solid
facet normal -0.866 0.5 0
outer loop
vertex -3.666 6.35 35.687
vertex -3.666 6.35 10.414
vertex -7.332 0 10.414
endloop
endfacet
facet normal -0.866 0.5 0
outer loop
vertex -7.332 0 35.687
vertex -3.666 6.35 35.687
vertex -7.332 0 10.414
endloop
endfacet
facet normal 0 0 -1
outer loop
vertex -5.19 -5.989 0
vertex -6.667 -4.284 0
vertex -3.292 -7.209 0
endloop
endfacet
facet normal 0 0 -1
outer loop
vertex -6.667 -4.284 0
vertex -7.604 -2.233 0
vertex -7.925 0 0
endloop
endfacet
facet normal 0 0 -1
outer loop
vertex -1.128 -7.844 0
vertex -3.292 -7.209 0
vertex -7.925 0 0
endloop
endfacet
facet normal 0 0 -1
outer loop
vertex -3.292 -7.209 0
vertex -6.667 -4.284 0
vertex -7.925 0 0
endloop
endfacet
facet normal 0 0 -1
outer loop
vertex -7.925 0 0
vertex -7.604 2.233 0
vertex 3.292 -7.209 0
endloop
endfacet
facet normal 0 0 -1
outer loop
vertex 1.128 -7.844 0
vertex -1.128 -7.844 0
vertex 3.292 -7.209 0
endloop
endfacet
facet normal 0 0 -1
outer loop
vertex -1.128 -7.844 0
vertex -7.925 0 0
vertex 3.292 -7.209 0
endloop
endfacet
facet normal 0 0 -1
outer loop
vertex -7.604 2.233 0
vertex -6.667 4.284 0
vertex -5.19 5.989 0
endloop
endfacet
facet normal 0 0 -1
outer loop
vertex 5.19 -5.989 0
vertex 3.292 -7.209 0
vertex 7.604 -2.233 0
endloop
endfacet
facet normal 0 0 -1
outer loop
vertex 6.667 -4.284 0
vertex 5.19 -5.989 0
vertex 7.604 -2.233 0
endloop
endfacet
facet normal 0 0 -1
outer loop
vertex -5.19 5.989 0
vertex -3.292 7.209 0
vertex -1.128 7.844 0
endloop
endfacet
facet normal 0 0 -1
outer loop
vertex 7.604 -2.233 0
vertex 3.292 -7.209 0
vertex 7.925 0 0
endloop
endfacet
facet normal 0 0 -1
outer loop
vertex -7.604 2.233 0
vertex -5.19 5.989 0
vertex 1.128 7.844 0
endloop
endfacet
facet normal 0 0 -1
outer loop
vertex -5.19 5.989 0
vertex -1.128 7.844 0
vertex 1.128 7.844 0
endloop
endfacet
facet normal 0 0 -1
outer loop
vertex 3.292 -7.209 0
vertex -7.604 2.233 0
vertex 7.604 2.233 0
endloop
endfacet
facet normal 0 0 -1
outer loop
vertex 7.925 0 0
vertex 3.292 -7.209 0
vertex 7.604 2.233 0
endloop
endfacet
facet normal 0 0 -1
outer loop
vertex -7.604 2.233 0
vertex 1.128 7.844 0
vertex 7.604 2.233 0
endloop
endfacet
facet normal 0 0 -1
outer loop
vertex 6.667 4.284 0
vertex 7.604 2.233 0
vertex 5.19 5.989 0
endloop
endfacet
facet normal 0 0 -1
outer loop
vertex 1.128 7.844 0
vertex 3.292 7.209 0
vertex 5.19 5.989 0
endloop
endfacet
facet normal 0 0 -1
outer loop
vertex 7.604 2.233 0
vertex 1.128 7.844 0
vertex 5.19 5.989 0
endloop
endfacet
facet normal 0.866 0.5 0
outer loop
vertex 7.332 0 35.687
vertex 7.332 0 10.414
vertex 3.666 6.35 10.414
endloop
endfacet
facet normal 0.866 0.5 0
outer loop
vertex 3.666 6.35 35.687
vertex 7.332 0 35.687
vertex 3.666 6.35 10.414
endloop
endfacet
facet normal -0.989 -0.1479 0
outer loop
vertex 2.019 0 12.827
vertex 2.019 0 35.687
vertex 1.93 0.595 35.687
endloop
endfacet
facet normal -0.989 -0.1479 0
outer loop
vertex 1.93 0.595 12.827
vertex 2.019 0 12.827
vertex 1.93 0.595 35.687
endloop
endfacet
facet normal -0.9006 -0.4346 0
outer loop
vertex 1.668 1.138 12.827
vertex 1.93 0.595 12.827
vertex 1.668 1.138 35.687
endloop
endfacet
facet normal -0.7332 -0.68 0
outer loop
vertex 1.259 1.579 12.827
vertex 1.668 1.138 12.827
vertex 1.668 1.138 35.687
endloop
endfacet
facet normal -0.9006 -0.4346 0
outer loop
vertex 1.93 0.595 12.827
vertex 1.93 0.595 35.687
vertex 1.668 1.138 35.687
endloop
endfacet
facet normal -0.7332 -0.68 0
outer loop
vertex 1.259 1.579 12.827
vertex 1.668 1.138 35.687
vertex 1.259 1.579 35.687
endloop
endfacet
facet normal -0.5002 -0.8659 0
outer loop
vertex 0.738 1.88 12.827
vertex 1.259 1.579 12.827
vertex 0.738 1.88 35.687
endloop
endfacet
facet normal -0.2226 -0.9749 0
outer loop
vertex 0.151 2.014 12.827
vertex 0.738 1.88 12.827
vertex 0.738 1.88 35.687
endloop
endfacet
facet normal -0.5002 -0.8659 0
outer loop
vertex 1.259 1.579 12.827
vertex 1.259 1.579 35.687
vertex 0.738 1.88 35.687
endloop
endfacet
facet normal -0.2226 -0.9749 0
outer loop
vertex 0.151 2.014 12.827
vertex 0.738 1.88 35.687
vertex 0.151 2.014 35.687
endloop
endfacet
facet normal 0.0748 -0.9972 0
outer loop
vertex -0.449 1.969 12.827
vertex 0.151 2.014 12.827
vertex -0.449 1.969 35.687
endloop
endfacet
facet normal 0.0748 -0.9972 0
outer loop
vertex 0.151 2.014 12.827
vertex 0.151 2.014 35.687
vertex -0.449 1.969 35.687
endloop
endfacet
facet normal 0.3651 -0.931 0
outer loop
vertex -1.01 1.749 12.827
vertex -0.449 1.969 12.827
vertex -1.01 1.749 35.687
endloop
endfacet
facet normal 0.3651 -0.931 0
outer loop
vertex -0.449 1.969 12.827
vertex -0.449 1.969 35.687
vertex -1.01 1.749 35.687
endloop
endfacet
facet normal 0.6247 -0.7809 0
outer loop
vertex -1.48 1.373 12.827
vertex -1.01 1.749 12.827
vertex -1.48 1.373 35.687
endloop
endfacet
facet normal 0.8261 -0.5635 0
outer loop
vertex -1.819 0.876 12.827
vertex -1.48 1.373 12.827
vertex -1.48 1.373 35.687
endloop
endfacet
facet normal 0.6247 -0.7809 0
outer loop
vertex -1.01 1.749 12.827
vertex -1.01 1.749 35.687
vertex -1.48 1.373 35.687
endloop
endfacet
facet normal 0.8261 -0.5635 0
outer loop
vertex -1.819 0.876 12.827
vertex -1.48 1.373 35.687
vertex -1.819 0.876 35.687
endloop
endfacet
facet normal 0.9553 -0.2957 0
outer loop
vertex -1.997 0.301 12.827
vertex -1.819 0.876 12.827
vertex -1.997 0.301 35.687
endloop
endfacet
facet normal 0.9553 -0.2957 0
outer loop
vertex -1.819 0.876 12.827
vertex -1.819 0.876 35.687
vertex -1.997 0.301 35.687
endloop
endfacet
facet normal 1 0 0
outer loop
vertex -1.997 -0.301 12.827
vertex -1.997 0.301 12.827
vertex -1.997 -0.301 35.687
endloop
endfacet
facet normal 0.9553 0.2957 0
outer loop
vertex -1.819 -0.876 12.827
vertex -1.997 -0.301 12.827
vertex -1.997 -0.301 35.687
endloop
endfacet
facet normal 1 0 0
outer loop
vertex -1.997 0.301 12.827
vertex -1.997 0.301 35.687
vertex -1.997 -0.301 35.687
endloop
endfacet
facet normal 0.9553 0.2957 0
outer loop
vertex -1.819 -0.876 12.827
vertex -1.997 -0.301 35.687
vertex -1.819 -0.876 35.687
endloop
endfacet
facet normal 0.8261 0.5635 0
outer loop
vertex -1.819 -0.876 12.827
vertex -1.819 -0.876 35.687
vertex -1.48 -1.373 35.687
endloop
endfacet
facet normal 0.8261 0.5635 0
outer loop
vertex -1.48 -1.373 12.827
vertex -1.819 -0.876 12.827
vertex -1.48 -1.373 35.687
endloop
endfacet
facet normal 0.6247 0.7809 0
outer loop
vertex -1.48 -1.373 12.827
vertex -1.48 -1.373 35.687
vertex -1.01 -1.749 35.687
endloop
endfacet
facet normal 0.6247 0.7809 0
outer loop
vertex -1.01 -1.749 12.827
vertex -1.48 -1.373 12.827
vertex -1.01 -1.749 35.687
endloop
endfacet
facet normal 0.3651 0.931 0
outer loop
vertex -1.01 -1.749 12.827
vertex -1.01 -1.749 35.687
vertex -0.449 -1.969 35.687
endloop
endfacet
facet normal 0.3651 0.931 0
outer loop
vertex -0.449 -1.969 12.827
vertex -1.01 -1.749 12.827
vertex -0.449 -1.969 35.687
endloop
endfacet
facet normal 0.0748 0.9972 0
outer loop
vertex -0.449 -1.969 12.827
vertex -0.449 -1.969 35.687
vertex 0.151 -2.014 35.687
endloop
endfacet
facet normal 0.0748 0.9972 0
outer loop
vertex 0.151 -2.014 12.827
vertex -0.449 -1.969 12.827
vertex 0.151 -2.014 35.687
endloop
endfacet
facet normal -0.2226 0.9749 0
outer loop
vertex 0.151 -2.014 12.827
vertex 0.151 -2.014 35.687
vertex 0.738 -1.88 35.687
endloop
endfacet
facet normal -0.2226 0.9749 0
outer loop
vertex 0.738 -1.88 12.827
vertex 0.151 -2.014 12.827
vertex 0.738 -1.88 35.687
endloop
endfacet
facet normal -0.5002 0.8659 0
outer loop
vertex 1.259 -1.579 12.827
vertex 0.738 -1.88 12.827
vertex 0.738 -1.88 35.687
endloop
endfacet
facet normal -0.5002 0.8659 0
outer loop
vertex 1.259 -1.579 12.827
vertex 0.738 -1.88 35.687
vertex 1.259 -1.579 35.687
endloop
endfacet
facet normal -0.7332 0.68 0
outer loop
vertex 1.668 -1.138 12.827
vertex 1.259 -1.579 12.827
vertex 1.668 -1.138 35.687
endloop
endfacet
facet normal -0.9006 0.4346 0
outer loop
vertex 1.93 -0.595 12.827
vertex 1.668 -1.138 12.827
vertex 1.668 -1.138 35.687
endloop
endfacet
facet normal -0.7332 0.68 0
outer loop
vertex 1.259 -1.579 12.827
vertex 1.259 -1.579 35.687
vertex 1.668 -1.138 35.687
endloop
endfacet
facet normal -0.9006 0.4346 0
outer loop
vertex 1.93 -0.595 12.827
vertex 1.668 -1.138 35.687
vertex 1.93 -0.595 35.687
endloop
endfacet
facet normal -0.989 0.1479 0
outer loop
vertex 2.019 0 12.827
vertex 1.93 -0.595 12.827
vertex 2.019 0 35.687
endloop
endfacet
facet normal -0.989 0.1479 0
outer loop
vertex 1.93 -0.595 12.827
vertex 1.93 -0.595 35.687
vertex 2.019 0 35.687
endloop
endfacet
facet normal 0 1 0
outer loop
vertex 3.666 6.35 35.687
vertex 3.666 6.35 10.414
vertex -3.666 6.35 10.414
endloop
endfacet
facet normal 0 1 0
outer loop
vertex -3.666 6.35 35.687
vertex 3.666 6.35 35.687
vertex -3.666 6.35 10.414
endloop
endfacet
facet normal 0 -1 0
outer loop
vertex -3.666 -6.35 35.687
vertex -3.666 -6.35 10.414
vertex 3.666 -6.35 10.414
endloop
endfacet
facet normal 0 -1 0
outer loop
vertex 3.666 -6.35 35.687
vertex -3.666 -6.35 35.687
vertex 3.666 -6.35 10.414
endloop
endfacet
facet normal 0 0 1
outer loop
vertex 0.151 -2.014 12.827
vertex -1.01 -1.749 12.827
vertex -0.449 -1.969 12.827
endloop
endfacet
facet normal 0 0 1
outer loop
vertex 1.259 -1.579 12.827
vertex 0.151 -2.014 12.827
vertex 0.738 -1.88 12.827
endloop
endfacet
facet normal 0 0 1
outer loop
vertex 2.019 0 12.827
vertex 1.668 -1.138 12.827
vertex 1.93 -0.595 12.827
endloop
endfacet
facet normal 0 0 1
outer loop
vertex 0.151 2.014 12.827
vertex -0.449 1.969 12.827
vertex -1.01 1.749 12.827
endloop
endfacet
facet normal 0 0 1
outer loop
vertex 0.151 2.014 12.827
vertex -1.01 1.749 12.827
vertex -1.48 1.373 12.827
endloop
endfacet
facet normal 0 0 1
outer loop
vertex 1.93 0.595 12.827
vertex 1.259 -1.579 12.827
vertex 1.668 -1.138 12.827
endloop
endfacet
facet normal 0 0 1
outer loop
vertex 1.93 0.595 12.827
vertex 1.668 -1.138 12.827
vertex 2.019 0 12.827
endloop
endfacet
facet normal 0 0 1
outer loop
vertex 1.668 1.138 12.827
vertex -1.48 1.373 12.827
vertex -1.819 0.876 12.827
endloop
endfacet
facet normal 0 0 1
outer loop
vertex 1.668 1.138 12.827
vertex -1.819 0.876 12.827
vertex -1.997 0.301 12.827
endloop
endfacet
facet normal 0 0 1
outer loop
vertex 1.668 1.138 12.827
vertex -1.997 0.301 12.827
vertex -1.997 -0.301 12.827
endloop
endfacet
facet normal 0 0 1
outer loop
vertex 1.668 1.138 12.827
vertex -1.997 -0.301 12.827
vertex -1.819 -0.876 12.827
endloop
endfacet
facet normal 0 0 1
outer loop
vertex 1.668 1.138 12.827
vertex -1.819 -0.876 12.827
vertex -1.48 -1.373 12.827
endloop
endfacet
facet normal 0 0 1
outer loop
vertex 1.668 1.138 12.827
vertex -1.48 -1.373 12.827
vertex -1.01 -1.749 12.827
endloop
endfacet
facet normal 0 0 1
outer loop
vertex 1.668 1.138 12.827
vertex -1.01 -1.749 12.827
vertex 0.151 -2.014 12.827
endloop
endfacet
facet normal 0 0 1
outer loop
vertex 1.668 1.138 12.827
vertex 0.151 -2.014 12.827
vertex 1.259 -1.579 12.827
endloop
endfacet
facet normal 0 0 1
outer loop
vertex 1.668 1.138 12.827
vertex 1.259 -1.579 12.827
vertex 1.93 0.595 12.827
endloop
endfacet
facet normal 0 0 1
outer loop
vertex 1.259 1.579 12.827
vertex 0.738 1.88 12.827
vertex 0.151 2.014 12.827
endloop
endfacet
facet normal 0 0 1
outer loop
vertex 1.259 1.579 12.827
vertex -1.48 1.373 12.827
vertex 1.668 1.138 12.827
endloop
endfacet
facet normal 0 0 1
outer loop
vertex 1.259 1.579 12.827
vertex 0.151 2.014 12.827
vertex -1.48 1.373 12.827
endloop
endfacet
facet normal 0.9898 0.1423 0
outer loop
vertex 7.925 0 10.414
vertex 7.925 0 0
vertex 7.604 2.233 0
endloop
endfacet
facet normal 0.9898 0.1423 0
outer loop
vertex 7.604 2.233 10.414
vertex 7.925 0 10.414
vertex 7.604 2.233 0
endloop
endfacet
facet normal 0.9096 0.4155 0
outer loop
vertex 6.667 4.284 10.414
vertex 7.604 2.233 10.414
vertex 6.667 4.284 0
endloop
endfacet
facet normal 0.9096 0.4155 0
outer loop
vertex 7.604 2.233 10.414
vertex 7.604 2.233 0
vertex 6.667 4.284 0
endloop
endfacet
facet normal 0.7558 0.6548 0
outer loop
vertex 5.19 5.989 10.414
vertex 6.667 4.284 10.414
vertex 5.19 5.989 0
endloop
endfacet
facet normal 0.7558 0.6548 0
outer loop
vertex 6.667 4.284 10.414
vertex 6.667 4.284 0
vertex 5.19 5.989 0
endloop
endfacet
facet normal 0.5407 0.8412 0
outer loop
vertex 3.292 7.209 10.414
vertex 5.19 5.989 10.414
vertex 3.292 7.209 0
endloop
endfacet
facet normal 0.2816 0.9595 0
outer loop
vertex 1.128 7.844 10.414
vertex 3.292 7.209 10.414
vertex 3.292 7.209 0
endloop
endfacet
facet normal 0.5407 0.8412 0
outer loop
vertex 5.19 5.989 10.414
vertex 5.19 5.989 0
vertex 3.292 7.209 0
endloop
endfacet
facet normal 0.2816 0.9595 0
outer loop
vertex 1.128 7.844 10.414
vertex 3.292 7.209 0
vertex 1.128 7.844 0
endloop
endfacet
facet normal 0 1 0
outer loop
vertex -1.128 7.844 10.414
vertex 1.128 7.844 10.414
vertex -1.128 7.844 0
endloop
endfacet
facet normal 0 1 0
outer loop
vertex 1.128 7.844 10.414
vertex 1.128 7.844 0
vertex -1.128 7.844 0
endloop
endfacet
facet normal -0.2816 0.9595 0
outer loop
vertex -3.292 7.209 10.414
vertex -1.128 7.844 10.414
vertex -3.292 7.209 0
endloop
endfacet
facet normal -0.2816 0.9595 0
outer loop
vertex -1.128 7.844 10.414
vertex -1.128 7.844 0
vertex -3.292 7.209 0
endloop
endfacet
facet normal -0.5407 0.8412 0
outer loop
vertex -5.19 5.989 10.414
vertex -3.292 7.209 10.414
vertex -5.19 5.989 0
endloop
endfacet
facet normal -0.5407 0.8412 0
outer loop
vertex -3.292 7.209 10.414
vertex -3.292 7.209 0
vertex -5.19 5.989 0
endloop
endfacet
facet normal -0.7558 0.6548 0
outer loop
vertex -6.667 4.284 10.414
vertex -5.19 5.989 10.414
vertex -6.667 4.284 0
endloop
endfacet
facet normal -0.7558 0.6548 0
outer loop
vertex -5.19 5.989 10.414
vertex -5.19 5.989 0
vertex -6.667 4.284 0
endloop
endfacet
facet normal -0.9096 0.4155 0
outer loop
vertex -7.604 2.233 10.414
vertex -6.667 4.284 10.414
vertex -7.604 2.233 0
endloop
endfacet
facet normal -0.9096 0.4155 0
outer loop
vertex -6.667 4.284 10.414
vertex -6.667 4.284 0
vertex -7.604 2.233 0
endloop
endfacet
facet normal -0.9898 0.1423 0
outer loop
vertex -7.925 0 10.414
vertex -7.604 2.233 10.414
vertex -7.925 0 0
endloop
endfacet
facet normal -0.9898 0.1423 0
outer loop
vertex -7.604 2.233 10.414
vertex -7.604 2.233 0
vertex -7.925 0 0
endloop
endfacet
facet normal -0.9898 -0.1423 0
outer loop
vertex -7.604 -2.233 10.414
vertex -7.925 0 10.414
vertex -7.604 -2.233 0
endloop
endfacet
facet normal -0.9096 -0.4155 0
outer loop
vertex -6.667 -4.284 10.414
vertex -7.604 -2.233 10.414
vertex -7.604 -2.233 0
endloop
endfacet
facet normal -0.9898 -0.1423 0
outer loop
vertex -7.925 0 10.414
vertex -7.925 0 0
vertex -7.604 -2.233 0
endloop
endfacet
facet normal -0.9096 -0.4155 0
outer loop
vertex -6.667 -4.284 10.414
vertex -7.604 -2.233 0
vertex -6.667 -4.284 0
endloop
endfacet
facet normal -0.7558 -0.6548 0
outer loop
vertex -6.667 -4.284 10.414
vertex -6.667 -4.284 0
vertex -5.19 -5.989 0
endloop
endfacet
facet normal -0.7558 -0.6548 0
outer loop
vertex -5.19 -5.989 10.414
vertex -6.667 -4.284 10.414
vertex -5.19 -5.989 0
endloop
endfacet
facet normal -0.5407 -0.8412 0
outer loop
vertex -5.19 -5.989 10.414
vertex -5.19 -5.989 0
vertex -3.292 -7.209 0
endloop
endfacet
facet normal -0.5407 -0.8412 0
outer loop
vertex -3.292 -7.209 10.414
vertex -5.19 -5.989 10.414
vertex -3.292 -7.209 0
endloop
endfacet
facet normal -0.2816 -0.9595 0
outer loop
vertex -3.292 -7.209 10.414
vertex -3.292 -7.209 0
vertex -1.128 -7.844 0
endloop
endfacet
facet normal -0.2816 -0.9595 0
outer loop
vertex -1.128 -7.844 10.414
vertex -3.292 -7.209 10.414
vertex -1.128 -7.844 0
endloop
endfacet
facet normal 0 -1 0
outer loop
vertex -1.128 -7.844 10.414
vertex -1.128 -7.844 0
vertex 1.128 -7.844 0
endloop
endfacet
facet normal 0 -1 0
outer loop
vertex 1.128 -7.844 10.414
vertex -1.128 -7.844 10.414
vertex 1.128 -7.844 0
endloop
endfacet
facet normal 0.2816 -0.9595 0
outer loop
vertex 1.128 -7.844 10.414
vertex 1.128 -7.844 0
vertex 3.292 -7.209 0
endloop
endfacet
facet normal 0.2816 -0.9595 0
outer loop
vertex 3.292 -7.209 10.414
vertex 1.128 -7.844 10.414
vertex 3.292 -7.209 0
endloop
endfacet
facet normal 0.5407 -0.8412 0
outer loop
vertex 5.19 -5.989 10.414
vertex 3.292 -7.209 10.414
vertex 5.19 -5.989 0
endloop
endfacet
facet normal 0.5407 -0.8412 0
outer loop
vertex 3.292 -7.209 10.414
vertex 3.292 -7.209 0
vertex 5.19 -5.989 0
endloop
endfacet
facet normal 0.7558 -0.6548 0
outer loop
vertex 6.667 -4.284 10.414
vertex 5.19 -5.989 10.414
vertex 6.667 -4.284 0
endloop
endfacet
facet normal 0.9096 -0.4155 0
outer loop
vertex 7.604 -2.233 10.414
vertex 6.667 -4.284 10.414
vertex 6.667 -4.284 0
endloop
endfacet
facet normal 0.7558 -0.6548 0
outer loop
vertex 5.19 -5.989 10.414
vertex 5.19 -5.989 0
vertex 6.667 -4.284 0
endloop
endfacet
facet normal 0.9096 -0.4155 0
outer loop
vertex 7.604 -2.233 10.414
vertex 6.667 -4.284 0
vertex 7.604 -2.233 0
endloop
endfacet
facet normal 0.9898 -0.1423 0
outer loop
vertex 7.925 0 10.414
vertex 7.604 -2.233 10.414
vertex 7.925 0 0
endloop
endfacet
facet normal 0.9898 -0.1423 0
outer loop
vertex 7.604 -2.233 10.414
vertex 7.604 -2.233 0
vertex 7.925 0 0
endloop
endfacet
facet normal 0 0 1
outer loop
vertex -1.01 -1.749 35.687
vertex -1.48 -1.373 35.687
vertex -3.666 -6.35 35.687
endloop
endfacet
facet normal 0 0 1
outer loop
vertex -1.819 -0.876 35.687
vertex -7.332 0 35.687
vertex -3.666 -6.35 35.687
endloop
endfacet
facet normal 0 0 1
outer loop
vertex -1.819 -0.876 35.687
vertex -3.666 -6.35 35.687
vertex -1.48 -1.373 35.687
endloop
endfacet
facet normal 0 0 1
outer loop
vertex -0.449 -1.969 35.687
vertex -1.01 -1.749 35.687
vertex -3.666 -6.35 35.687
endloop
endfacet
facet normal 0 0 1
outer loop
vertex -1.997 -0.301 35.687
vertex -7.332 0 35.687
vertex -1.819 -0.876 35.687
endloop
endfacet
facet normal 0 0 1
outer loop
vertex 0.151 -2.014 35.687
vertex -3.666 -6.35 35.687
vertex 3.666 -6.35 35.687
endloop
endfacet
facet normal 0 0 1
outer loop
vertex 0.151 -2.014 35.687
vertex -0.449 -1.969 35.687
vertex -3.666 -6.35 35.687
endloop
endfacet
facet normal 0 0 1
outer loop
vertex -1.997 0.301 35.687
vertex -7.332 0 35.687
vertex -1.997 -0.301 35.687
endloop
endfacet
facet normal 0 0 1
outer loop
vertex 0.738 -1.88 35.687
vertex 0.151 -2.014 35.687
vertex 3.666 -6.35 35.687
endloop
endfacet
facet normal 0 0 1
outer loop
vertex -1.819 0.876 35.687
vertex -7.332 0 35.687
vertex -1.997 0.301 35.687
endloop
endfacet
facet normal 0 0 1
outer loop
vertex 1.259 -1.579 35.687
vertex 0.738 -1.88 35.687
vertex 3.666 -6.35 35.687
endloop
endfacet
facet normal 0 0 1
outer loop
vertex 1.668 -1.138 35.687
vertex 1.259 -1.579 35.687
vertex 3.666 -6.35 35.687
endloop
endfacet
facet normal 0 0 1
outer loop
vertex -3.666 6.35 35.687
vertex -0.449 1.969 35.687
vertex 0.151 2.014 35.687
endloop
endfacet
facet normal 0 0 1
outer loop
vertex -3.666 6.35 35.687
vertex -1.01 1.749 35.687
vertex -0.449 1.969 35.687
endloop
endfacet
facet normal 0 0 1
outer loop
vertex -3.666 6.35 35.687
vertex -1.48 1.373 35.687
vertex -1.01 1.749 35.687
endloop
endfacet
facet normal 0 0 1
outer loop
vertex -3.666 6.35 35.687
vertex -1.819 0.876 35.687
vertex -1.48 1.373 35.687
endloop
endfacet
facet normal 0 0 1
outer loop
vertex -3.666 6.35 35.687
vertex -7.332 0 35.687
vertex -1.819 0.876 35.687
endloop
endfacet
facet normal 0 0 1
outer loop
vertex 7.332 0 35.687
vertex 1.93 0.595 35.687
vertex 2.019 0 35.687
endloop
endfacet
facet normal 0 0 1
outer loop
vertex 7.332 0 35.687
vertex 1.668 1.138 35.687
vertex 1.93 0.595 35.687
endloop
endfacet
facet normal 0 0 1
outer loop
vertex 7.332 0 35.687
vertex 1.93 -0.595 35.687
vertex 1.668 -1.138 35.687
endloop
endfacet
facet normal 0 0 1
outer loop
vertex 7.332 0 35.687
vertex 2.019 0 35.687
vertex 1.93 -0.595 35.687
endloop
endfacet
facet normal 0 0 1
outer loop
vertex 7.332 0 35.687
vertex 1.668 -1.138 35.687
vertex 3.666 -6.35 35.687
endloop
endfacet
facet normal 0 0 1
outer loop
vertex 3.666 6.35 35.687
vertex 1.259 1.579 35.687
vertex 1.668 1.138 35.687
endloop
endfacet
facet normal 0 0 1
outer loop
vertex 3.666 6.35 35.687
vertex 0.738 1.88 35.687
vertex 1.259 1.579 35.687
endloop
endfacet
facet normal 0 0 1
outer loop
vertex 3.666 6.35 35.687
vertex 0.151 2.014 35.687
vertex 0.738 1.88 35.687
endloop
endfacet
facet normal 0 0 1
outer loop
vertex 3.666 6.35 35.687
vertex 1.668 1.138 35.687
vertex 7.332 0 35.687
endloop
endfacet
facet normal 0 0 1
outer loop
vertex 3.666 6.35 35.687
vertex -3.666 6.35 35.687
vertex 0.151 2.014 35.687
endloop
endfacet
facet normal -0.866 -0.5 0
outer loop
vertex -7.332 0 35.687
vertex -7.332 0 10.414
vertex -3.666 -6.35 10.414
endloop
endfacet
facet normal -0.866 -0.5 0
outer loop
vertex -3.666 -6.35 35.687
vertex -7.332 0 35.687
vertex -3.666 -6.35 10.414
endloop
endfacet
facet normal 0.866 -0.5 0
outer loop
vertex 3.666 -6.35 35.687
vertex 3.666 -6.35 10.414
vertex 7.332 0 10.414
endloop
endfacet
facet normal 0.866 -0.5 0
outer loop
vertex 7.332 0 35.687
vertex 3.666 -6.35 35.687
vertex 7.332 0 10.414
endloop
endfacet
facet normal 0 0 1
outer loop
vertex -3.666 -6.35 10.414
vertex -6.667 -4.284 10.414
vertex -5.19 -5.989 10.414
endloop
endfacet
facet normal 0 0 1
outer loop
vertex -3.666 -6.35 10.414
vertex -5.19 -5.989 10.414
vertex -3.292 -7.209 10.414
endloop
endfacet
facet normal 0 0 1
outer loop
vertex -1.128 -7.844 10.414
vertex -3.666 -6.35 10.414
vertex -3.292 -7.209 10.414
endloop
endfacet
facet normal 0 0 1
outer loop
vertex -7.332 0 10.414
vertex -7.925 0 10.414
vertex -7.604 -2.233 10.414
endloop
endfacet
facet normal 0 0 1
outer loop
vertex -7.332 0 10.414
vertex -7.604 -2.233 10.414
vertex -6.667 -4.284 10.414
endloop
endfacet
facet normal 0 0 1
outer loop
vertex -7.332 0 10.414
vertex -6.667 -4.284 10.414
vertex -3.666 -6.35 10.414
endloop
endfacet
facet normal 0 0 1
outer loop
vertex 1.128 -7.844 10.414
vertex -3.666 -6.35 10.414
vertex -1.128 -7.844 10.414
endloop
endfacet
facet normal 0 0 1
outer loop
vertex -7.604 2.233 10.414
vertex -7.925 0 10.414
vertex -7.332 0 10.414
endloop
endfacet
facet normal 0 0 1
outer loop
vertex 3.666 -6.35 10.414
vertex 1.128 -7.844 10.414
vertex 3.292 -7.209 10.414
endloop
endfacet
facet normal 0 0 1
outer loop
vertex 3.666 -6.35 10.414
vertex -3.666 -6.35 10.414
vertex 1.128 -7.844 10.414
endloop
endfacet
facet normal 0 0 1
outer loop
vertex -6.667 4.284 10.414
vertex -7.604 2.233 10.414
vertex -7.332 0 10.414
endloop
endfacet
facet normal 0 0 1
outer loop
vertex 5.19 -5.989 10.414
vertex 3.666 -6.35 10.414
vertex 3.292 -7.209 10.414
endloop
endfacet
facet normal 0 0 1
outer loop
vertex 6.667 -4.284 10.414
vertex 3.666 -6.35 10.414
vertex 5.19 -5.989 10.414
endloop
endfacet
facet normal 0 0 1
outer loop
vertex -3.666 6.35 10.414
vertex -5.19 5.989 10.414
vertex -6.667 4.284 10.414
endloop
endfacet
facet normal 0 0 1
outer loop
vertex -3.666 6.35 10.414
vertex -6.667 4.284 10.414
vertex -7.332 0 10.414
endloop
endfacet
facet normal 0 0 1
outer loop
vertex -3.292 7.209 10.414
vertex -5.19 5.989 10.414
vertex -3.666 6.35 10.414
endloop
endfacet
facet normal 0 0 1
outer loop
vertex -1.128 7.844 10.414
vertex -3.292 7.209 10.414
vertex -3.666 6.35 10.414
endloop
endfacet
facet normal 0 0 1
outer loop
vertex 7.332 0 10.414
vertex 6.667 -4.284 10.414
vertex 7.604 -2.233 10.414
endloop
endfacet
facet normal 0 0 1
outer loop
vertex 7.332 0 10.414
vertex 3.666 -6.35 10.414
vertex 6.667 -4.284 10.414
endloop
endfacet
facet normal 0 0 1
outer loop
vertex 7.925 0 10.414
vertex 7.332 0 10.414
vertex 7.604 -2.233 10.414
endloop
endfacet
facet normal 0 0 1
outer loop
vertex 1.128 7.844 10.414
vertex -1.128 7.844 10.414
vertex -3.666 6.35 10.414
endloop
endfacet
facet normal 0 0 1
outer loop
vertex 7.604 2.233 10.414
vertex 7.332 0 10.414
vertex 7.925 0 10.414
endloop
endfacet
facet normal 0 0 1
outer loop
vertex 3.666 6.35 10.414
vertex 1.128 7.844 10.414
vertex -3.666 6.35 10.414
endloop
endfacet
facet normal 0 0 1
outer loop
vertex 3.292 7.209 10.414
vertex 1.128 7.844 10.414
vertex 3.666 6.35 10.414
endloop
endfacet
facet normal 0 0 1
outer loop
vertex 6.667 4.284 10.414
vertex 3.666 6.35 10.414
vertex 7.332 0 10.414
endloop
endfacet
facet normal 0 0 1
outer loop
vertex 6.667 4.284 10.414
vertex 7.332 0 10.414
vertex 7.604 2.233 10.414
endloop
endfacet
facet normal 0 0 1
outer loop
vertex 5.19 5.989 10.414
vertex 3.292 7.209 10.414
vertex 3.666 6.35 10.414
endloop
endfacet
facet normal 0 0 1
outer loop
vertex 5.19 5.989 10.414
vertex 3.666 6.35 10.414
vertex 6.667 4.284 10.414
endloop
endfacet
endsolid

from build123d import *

# Parameters (mm, degrees)
SKETCH2_R           = 7.9248
BOSS_EXTRUDE1_DEPTH = 10.414
BOSS_EXTRUDE2_DEPTH = 25.273
SKETCH4_R           = 2.0193
CUT_EXTRUDE1_DEPTH  = 22.86


with BuildPart() as part:
    # Sketch2 → Boss-Extrude1 (new body)
    with BuildSketch(Plane.XY):
        Circle(SKETCH2_R)
    extrude(amount=BOSS_EXTRUDE1_DEPTH)

    # Sketch3 → Boss-Extrude2 (add)
    with BuildSketch(Plane.XY.offset(10.414)):
        Polygon((7.332348419, 0), (3.666174209, 6.35), (-3.666174209, 6.35), (-7.332348419, 0), (-3.666174209, -6.35), (3.666174209, -6.35), align=None)
    extrude(amount=BOSS_EXTRUDE2_DEPTH)

    # Sketch4 → Cut-Extrude1 (cut)
    with BuildSketch(Plane.XY.offset(35.687)):
        Circle(SKETCH4_R)
    extrude(amount=-CUT_EXTRUDE1_DEPTH, mode=Mode.SUBTRACT)


solid = part.part
